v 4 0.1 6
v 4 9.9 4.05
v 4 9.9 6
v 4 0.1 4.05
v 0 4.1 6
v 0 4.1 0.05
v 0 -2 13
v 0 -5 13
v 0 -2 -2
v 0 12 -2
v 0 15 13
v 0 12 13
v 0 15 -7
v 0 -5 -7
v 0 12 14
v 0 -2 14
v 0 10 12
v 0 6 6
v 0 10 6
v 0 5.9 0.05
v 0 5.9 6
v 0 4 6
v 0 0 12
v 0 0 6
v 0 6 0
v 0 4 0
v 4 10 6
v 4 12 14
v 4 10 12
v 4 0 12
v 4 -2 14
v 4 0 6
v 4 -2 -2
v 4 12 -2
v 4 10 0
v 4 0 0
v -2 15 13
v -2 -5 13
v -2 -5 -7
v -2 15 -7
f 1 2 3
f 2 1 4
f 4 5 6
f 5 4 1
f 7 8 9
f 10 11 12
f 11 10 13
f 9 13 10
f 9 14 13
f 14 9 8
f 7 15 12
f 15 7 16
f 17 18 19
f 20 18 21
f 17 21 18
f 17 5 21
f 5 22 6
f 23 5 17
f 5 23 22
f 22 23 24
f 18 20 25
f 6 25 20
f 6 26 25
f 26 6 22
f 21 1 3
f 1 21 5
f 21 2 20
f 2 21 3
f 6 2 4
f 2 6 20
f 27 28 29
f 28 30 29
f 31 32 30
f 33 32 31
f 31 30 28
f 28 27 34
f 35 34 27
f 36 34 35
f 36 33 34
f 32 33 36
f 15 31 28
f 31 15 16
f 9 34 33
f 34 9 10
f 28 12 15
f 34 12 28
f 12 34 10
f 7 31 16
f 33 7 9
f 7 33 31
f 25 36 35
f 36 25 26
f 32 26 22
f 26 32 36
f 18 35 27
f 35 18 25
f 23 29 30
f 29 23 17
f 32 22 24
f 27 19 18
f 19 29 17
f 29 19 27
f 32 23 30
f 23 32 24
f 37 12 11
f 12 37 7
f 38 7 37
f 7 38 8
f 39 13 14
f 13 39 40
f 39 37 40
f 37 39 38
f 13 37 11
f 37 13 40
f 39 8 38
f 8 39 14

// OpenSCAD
module wall_mounted_buckle_anchor_notch (height = 10, wall_thickness = 2, tolerance=0.1) {
  thickness = wall_thickness * 2;
      
  linear_extrude(height=height) {
    polygon(
      points=[
        [0,0],
        [thickness, thickness],
        [thickness, 0]
      ], 
      paths=[[0,1,2]]
    );
  }  
}

module wall_mounted_buckle_anchor (depth = 10, height = 6, wall_thickness = 2, tolerance = 0.1, negative=false) {
  thickness = wall_thickness * 2;
  anchorBodyDepth = depth - wall_thickness * 2;

  difference() {
    hull() {
      translate([0, depth - thickness - tolerance, 0]) {
        wall_mounted_buckle_anchor_notch(height, wall_thickness, tolerance);
      }

      translate([0, thickness + tolerance, height]) {
        rotate(180, [1, 0, 0]) {
          wall_mounted_buckle_anchor_notch(height, wall_thickness, tolerance);
        }  
      }     
    }
  
    if (!negative) {
      negativeOffset = 0.05;
      translate([0, anchorBodyDepth + wall_thickness * 2 + negativeOffset, -negativeOffset]) {
        rotate(90, [1, 0, 0]) {
          linear_extrude(height=depth + (wall_thickness + negativeOffset) * 2) {
            polygon(points=[
                [thickness + negativeOffset,-negativeOffset], // (1,0)
                [-negativeOffset - tolerance, -negativeOffset], // (0,0)
                [thickness + negativeOffset, thickness + negativeOffset + tolerance] // (1,1)
              ], 
              paths=[[0,1,2]]);
          }  
        }
      } 
    }
  }
}


module buckle (depth = 10, height = 6, wall_thickness = 2, tolerance = 0.1) {
  thickness = wall_thickness * 2;
  buckleDepth = depth + wall_thickness * 2;

  difference() {
    translate([0, -wall_thickness, -wall_thickness]) {
      cube(size=[thickness, buckleDepth, height * 2 + wall_thickness * 2]);
    }

    translate([-tolerance/2, -tolerance/2, 0]) {
      wall_mounted_buckle_anchor(depth + tolerance, height + tolerance, wall_thickness + tolerance/2, 0, true);
    }

    translate([-tolerance, 0, height]) {
      cube(size=[thickness + tolerance * 2, depth, height]);
    }
  }
}

wall_thickness = 2;
tolerance = 0.1;
depth = 20;

translate([-2, -5, -7]) {
  cube(size=[2, 20, 20]);
}
wall_mounted_buckle_anchor(wall_thickness=wall_thickness, tolerance=tolerance);
 buckle(wall_thickness=wall_thickness, tolerance=tolerance);
